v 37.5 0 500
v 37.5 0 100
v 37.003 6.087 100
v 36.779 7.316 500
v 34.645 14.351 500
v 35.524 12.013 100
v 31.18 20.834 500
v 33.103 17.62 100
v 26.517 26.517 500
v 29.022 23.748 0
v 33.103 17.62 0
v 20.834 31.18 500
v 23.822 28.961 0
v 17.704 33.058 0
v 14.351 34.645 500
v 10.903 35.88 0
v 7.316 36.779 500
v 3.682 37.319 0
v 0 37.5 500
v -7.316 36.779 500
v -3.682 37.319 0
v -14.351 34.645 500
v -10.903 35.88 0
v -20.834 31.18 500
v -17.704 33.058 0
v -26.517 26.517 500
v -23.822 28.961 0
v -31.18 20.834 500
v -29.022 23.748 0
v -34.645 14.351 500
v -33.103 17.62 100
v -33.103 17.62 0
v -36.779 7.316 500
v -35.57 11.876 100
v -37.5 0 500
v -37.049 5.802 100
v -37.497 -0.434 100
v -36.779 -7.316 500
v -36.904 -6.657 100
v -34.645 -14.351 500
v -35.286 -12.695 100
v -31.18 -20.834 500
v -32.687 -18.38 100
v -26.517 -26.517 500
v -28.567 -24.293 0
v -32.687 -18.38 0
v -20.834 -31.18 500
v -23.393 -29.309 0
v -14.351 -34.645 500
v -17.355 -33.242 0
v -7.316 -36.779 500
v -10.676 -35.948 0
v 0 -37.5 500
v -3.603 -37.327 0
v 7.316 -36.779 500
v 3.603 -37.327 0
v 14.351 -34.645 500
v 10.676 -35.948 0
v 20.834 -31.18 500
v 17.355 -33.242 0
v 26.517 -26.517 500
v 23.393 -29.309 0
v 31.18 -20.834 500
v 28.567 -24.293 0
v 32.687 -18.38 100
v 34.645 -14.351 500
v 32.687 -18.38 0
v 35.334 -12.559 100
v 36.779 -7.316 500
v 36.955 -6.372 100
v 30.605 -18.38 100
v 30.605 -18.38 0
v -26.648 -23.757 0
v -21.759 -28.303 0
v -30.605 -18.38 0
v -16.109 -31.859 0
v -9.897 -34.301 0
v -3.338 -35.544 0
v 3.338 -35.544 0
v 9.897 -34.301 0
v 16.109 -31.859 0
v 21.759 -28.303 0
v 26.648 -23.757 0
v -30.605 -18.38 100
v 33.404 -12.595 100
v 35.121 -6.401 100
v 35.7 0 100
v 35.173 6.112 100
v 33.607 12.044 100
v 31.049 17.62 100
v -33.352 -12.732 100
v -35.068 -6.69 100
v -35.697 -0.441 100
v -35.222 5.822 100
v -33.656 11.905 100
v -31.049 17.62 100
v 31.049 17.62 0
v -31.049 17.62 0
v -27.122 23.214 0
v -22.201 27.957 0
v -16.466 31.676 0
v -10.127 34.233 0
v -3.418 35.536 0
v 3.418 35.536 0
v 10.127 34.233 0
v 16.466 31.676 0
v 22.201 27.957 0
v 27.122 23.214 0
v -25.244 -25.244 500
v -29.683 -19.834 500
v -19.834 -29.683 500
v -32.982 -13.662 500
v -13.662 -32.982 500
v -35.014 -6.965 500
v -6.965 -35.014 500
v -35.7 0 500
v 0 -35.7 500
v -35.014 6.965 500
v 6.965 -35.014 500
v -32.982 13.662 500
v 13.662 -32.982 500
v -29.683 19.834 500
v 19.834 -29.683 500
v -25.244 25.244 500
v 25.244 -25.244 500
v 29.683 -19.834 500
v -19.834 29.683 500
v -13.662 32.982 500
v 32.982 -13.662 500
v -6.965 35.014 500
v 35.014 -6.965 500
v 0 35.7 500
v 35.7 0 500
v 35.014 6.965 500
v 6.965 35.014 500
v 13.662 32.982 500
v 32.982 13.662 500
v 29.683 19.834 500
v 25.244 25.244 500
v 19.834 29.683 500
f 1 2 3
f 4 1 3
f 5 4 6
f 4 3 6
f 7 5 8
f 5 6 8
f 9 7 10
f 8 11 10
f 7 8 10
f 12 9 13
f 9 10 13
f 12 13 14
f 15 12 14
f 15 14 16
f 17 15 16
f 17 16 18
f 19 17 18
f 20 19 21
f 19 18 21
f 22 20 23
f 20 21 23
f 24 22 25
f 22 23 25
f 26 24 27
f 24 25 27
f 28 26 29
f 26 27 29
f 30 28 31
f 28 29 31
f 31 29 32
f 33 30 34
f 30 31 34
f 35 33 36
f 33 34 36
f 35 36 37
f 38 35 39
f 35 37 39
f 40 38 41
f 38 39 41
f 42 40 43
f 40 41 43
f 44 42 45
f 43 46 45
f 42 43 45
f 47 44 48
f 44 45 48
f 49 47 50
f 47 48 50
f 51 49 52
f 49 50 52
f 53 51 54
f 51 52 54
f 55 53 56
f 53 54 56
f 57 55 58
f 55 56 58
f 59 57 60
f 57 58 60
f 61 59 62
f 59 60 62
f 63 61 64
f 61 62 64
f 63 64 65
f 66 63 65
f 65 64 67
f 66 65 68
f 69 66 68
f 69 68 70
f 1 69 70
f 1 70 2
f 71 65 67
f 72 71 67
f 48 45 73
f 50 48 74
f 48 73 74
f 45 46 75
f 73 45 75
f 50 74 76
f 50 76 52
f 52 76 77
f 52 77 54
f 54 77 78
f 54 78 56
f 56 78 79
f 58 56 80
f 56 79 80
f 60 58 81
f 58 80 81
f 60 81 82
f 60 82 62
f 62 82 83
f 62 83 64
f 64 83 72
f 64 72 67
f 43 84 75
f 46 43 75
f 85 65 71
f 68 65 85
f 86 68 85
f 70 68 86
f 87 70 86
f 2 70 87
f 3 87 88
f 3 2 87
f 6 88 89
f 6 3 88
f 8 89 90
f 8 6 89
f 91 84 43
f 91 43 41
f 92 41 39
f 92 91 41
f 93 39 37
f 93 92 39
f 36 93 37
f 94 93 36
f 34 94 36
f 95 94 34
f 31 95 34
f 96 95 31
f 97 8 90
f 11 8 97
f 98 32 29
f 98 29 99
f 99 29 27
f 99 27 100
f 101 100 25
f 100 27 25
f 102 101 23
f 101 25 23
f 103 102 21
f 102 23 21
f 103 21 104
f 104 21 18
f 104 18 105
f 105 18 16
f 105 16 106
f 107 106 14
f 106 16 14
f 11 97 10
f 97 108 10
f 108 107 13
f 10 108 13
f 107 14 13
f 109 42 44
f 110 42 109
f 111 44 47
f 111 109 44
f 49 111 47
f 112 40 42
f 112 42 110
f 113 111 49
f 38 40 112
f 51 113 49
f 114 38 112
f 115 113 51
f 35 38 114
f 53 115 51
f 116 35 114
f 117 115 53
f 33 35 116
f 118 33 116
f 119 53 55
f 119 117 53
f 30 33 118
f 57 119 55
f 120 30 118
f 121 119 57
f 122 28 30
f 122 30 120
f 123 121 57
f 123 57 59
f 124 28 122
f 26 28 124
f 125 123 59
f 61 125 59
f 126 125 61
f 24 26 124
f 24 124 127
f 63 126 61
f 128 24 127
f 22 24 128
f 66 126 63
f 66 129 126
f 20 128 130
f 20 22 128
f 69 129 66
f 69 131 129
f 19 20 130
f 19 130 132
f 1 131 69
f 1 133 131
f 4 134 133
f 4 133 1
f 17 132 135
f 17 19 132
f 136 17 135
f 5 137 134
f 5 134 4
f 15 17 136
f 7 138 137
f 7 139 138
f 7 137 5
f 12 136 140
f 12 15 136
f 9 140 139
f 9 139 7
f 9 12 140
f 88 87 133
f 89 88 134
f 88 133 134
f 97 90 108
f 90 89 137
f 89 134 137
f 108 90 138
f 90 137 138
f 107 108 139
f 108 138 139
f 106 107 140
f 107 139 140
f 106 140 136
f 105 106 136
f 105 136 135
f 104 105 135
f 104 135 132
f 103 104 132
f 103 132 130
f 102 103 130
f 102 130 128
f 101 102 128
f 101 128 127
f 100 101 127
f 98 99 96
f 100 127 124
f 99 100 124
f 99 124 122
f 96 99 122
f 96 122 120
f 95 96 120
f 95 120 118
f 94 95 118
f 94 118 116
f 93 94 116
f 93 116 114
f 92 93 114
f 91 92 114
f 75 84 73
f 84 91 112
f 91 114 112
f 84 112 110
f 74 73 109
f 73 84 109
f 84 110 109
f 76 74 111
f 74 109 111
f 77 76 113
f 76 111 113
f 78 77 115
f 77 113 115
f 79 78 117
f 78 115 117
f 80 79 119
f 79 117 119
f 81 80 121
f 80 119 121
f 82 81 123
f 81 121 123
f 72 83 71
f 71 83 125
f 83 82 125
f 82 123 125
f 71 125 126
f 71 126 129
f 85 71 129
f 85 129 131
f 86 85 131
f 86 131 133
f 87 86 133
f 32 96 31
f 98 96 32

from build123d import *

# Parameters (mm, degrees)
SKETCH2_R           = 37.5
BOSS_EXTRUDE1_DEPTH = 500
SKETCH3_R           = 35.7
CUT_EXTRUDE1_DEPTH  = 500
SKETCH4_W           = 100
SKETCH4_H           = 36
CUT_EXTRUDE2_DEPTH  = 500


with BuildPart() as part:
    # Sketch2 → Boss-Extrude1 (new body)
    with BuildSketch(Plane.XY):
        Circle(SKETCH2_R)
    extrude(amount=BOSS_EXTRUDE1_DEPTH)

    # Sketch3 → Cut-Extrude1 (cut)
    with BuildSketch(Plane.XY.offset(500)):
        Circle(SKETCH3_R)
    extrude(amount=-CUT_EXTRUDE1_DEPTH, mode=Mode.SUBTRACT)

    # Sketch4 → Cut-Extrude2 (cut, symmetric)
    with BuildSketch(Plane(origin=(0, 0, 0), x_dir=(0, 0, -1), z_dir=(1, 0, 0))):
        with Locations((-50, -0.380488828)):
            Rectangle(SKETCH4_W, SKETCH4_H)
    extrude(amount=CUT_EXTRUDE2_DEPTH, both=True, mode=Mode.SUBTRACT)


solid = part.part
